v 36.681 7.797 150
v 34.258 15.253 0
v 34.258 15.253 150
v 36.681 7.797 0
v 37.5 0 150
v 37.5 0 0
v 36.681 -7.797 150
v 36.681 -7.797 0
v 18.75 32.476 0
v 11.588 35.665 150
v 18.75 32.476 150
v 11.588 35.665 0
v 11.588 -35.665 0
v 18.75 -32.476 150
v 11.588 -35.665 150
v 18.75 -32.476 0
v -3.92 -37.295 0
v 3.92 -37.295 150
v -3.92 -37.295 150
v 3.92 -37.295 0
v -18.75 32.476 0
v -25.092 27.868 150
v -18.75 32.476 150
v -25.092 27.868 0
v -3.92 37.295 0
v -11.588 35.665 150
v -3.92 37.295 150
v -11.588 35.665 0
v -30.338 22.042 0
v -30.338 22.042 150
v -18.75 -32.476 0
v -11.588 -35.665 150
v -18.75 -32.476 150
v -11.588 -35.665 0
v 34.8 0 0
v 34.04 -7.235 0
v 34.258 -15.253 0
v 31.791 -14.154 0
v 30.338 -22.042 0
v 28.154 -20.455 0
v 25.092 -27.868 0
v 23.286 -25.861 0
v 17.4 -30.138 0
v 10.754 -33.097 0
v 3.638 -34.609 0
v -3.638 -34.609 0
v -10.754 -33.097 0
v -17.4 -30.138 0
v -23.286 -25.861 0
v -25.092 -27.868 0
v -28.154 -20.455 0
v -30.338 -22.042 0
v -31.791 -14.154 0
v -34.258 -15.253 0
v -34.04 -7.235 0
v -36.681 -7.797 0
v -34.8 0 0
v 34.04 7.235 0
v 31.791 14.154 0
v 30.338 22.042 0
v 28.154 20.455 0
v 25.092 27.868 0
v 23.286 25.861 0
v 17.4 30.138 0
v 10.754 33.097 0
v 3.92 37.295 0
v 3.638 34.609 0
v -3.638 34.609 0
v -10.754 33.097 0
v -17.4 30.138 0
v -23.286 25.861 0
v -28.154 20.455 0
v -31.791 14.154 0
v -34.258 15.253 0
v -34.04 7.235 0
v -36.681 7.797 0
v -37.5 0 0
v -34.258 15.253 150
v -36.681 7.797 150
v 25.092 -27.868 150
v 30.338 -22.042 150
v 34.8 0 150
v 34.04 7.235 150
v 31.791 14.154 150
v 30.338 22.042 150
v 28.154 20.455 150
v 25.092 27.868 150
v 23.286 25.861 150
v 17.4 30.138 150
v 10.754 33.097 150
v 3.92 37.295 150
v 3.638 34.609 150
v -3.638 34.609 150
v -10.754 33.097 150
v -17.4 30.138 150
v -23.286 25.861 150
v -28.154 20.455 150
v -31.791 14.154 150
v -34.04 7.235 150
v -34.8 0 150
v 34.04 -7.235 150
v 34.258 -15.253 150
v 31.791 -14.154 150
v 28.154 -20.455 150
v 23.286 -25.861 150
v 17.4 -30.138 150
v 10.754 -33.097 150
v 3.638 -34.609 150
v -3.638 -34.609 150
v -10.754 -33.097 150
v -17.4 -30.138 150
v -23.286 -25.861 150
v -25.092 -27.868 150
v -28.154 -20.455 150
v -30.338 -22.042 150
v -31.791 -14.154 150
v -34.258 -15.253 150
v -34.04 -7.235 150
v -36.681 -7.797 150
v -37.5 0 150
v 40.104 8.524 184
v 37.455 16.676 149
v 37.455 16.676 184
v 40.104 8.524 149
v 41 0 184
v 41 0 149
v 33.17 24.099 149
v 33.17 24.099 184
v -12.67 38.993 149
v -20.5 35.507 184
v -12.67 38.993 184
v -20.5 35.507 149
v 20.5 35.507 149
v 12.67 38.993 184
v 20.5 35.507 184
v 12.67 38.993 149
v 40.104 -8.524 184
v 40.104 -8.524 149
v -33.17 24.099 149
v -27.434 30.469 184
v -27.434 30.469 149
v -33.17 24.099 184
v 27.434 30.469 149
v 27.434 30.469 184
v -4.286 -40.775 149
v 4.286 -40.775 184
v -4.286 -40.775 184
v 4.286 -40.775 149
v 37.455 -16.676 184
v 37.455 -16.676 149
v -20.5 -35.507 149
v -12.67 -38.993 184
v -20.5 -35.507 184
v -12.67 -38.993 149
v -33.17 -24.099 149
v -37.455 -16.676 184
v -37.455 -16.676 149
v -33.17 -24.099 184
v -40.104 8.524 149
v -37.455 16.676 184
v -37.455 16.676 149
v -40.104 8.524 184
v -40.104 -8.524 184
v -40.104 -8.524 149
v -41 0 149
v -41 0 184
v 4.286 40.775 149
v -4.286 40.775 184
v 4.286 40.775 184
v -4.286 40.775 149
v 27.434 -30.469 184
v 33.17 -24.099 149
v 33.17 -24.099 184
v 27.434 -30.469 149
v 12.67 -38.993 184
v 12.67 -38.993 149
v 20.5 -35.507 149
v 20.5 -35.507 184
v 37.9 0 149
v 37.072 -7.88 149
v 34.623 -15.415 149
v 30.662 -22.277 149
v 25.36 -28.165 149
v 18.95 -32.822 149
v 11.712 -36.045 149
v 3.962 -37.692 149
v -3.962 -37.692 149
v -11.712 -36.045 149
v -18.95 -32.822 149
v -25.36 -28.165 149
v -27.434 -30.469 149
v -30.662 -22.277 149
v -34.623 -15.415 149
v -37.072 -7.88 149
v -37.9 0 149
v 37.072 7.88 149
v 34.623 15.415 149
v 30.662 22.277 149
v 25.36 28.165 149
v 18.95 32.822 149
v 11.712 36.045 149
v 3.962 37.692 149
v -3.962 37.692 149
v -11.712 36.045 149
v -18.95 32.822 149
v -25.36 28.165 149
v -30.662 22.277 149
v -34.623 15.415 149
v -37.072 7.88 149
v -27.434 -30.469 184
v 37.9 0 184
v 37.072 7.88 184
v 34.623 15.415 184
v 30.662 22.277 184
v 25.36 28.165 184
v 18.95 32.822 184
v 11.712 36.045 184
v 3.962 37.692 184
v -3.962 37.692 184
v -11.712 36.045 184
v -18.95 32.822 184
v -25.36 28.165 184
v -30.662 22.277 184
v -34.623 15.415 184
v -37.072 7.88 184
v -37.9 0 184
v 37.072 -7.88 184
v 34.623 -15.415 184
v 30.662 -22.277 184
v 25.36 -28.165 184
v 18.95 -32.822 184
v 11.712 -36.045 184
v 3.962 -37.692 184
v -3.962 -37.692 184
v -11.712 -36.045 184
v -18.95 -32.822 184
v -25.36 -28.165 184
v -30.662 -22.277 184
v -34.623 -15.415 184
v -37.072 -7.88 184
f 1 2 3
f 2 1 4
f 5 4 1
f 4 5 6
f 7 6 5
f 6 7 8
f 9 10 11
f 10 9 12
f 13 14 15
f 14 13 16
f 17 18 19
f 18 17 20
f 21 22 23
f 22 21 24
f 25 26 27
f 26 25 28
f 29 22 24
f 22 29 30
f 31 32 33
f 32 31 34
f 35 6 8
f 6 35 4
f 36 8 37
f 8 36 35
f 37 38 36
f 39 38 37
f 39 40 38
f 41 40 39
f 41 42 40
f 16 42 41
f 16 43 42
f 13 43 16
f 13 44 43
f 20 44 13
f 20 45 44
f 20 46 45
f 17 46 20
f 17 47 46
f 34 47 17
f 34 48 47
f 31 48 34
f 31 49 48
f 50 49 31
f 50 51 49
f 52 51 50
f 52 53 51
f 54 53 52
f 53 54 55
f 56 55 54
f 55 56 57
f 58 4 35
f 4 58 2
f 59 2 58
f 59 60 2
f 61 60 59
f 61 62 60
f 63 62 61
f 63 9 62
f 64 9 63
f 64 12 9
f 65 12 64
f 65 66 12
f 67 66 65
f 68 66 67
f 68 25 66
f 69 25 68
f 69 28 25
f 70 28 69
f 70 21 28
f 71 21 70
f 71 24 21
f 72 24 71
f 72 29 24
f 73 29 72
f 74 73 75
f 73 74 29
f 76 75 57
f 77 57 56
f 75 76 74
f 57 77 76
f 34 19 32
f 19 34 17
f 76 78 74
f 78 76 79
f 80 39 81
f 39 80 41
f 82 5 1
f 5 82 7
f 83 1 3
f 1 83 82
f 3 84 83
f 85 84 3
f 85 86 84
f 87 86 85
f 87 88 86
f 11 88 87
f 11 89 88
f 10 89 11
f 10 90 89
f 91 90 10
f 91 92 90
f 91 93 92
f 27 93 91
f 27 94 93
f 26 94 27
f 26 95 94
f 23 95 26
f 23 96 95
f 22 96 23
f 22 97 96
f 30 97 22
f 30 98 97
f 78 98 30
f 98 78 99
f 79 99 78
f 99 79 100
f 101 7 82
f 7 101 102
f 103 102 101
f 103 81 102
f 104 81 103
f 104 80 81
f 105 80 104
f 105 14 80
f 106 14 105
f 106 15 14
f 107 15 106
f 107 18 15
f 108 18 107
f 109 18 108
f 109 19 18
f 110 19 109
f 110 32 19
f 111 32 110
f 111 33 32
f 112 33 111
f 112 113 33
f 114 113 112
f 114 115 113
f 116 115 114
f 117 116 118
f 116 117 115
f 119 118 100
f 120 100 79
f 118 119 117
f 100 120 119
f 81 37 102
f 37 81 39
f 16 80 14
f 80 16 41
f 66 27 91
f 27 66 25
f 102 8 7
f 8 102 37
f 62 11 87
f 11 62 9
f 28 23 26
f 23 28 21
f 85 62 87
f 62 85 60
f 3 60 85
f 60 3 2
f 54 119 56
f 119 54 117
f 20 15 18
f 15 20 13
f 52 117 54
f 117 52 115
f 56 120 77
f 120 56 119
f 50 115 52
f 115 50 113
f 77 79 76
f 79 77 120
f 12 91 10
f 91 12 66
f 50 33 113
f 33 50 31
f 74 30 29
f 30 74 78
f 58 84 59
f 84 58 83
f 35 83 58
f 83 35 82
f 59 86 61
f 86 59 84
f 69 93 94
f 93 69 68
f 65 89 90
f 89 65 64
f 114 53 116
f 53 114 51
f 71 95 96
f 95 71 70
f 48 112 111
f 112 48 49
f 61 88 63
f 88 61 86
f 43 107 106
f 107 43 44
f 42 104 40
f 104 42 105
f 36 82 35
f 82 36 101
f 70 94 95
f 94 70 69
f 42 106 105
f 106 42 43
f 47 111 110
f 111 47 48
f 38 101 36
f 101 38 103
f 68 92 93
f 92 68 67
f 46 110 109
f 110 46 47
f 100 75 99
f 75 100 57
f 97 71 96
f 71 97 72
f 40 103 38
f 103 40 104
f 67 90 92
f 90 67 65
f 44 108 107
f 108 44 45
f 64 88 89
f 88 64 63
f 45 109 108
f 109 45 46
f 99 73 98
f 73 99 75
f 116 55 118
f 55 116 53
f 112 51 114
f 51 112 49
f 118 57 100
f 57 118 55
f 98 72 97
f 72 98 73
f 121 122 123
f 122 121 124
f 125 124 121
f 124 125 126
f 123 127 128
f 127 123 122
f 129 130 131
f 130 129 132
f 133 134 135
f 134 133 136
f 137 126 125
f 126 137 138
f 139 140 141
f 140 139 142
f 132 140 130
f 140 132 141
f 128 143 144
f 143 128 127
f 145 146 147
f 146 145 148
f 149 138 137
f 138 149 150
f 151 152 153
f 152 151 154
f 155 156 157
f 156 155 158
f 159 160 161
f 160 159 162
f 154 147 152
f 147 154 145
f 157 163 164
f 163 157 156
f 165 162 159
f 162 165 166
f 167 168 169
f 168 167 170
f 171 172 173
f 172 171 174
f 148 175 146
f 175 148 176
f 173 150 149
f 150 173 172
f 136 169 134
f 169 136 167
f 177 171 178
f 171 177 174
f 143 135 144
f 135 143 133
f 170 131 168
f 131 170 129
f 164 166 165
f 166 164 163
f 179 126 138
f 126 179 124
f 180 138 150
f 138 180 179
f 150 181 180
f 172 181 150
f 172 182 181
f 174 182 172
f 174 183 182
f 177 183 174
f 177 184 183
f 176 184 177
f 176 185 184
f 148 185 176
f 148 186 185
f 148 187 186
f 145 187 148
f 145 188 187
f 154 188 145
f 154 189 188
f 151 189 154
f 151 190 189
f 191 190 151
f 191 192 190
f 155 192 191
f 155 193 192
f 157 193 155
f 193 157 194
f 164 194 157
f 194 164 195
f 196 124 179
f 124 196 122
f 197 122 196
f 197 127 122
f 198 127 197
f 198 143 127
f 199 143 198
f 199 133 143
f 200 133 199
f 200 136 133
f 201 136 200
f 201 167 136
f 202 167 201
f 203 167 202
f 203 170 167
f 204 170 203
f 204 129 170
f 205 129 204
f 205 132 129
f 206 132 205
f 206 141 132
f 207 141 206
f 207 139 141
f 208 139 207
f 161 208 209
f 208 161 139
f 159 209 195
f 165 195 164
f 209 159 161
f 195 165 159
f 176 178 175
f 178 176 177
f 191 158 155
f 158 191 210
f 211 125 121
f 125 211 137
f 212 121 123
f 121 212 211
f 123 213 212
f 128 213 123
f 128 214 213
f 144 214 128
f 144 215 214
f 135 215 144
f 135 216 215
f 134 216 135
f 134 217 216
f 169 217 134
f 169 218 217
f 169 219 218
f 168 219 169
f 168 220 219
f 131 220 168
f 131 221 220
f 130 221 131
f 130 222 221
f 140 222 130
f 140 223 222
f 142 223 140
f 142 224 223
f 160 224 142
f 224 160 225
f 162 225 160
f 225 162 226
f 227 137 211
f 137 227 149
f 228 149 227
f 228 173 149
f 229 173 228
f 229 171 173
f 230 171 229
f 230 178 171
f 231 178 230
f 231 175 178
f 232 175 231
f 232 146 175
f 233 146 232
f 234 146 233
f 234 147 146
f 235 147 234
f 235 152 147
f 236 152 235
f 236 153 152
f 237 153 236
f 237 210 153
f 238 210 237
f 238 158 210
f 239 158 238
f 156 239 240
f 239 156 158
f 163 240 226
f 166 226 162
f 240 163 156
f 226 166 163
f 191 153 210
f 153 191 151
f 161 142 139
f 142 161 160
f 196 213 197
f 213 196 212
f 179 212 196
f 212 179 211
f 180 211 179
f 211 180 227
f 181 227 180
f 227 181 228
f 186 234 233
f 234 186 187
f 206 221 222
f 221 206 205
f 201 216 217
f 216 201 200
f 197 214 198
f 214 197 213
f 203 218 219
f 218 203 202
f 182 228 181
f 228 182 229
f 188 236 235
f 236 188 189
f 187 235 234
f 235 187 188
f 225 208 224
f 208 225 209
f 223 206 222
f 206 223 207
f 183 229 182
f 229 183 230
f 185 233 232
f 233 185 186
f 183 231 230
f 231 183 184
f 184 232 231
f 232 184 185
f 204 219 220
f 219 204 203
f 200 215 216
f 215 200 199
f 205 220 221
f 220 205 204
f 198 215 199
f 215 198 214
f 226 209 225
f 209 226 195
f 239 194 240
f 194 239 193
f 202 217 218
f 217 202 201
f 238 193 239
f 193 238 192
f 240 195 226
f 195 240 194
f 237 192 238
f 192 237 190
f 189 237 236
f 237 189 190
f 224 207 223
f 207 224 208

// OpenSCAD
// Parameters
length_mm = 150; //[75:300:1]
outer_diameter_mm = 75; //[60:90:0.5]
wall_thickness_mm = 2.7; //[1.5:5.4:0.1]
fitting_length_mm = 35; //[20:70:1]
fitting_radial_thickness_mm = 3.5; //[2:8:0.1]
fitting_bore_clearance_mm = 0.4; //[0.1:1.2:0.1]
overlap_mm = 1; //[0.5:2:0.1]
include_end_fitting = 1; //[0:1:1]

// HT Pipe Segment - Complete Geometry
module ht_pipe() {
  color([0.85, 0.85, 0.8]) { // PVC color
    difference() {
      // Outer pipe
      cylinder(h=length_mm, r=outer_diameter_mm/2, center=false);
      
      // Hollow bore
      translate([0, 0, -overlap_mm])
        cylinder(h=length_mm + overlap_mm*2, r=outer_diameter_mm/2 - wall_thickness_mm, center=false);
    }
    
    if (include_end_fitting) {
      difference() {
        // End fitting outer
        translate([0, 0, length_mm - overlap_mm])
          cylinder(h=fitting_length_mm, r=outer_diameter_mm/2 + fitting_radial_thickness_mm, center=false);
        
        // End fitting inner cutter
        translate([0, 0, length_mm - overlap_mm*2])
          cylinder(h=fitting_length_mm + overlap_mm*2, r=outer_diameter_mm/2 + fitting_bore_clearance_mm, center=false);
      }
    }
  }
}

// Assembly
module assembly() {
  ht_pipe();
}

assembly();
